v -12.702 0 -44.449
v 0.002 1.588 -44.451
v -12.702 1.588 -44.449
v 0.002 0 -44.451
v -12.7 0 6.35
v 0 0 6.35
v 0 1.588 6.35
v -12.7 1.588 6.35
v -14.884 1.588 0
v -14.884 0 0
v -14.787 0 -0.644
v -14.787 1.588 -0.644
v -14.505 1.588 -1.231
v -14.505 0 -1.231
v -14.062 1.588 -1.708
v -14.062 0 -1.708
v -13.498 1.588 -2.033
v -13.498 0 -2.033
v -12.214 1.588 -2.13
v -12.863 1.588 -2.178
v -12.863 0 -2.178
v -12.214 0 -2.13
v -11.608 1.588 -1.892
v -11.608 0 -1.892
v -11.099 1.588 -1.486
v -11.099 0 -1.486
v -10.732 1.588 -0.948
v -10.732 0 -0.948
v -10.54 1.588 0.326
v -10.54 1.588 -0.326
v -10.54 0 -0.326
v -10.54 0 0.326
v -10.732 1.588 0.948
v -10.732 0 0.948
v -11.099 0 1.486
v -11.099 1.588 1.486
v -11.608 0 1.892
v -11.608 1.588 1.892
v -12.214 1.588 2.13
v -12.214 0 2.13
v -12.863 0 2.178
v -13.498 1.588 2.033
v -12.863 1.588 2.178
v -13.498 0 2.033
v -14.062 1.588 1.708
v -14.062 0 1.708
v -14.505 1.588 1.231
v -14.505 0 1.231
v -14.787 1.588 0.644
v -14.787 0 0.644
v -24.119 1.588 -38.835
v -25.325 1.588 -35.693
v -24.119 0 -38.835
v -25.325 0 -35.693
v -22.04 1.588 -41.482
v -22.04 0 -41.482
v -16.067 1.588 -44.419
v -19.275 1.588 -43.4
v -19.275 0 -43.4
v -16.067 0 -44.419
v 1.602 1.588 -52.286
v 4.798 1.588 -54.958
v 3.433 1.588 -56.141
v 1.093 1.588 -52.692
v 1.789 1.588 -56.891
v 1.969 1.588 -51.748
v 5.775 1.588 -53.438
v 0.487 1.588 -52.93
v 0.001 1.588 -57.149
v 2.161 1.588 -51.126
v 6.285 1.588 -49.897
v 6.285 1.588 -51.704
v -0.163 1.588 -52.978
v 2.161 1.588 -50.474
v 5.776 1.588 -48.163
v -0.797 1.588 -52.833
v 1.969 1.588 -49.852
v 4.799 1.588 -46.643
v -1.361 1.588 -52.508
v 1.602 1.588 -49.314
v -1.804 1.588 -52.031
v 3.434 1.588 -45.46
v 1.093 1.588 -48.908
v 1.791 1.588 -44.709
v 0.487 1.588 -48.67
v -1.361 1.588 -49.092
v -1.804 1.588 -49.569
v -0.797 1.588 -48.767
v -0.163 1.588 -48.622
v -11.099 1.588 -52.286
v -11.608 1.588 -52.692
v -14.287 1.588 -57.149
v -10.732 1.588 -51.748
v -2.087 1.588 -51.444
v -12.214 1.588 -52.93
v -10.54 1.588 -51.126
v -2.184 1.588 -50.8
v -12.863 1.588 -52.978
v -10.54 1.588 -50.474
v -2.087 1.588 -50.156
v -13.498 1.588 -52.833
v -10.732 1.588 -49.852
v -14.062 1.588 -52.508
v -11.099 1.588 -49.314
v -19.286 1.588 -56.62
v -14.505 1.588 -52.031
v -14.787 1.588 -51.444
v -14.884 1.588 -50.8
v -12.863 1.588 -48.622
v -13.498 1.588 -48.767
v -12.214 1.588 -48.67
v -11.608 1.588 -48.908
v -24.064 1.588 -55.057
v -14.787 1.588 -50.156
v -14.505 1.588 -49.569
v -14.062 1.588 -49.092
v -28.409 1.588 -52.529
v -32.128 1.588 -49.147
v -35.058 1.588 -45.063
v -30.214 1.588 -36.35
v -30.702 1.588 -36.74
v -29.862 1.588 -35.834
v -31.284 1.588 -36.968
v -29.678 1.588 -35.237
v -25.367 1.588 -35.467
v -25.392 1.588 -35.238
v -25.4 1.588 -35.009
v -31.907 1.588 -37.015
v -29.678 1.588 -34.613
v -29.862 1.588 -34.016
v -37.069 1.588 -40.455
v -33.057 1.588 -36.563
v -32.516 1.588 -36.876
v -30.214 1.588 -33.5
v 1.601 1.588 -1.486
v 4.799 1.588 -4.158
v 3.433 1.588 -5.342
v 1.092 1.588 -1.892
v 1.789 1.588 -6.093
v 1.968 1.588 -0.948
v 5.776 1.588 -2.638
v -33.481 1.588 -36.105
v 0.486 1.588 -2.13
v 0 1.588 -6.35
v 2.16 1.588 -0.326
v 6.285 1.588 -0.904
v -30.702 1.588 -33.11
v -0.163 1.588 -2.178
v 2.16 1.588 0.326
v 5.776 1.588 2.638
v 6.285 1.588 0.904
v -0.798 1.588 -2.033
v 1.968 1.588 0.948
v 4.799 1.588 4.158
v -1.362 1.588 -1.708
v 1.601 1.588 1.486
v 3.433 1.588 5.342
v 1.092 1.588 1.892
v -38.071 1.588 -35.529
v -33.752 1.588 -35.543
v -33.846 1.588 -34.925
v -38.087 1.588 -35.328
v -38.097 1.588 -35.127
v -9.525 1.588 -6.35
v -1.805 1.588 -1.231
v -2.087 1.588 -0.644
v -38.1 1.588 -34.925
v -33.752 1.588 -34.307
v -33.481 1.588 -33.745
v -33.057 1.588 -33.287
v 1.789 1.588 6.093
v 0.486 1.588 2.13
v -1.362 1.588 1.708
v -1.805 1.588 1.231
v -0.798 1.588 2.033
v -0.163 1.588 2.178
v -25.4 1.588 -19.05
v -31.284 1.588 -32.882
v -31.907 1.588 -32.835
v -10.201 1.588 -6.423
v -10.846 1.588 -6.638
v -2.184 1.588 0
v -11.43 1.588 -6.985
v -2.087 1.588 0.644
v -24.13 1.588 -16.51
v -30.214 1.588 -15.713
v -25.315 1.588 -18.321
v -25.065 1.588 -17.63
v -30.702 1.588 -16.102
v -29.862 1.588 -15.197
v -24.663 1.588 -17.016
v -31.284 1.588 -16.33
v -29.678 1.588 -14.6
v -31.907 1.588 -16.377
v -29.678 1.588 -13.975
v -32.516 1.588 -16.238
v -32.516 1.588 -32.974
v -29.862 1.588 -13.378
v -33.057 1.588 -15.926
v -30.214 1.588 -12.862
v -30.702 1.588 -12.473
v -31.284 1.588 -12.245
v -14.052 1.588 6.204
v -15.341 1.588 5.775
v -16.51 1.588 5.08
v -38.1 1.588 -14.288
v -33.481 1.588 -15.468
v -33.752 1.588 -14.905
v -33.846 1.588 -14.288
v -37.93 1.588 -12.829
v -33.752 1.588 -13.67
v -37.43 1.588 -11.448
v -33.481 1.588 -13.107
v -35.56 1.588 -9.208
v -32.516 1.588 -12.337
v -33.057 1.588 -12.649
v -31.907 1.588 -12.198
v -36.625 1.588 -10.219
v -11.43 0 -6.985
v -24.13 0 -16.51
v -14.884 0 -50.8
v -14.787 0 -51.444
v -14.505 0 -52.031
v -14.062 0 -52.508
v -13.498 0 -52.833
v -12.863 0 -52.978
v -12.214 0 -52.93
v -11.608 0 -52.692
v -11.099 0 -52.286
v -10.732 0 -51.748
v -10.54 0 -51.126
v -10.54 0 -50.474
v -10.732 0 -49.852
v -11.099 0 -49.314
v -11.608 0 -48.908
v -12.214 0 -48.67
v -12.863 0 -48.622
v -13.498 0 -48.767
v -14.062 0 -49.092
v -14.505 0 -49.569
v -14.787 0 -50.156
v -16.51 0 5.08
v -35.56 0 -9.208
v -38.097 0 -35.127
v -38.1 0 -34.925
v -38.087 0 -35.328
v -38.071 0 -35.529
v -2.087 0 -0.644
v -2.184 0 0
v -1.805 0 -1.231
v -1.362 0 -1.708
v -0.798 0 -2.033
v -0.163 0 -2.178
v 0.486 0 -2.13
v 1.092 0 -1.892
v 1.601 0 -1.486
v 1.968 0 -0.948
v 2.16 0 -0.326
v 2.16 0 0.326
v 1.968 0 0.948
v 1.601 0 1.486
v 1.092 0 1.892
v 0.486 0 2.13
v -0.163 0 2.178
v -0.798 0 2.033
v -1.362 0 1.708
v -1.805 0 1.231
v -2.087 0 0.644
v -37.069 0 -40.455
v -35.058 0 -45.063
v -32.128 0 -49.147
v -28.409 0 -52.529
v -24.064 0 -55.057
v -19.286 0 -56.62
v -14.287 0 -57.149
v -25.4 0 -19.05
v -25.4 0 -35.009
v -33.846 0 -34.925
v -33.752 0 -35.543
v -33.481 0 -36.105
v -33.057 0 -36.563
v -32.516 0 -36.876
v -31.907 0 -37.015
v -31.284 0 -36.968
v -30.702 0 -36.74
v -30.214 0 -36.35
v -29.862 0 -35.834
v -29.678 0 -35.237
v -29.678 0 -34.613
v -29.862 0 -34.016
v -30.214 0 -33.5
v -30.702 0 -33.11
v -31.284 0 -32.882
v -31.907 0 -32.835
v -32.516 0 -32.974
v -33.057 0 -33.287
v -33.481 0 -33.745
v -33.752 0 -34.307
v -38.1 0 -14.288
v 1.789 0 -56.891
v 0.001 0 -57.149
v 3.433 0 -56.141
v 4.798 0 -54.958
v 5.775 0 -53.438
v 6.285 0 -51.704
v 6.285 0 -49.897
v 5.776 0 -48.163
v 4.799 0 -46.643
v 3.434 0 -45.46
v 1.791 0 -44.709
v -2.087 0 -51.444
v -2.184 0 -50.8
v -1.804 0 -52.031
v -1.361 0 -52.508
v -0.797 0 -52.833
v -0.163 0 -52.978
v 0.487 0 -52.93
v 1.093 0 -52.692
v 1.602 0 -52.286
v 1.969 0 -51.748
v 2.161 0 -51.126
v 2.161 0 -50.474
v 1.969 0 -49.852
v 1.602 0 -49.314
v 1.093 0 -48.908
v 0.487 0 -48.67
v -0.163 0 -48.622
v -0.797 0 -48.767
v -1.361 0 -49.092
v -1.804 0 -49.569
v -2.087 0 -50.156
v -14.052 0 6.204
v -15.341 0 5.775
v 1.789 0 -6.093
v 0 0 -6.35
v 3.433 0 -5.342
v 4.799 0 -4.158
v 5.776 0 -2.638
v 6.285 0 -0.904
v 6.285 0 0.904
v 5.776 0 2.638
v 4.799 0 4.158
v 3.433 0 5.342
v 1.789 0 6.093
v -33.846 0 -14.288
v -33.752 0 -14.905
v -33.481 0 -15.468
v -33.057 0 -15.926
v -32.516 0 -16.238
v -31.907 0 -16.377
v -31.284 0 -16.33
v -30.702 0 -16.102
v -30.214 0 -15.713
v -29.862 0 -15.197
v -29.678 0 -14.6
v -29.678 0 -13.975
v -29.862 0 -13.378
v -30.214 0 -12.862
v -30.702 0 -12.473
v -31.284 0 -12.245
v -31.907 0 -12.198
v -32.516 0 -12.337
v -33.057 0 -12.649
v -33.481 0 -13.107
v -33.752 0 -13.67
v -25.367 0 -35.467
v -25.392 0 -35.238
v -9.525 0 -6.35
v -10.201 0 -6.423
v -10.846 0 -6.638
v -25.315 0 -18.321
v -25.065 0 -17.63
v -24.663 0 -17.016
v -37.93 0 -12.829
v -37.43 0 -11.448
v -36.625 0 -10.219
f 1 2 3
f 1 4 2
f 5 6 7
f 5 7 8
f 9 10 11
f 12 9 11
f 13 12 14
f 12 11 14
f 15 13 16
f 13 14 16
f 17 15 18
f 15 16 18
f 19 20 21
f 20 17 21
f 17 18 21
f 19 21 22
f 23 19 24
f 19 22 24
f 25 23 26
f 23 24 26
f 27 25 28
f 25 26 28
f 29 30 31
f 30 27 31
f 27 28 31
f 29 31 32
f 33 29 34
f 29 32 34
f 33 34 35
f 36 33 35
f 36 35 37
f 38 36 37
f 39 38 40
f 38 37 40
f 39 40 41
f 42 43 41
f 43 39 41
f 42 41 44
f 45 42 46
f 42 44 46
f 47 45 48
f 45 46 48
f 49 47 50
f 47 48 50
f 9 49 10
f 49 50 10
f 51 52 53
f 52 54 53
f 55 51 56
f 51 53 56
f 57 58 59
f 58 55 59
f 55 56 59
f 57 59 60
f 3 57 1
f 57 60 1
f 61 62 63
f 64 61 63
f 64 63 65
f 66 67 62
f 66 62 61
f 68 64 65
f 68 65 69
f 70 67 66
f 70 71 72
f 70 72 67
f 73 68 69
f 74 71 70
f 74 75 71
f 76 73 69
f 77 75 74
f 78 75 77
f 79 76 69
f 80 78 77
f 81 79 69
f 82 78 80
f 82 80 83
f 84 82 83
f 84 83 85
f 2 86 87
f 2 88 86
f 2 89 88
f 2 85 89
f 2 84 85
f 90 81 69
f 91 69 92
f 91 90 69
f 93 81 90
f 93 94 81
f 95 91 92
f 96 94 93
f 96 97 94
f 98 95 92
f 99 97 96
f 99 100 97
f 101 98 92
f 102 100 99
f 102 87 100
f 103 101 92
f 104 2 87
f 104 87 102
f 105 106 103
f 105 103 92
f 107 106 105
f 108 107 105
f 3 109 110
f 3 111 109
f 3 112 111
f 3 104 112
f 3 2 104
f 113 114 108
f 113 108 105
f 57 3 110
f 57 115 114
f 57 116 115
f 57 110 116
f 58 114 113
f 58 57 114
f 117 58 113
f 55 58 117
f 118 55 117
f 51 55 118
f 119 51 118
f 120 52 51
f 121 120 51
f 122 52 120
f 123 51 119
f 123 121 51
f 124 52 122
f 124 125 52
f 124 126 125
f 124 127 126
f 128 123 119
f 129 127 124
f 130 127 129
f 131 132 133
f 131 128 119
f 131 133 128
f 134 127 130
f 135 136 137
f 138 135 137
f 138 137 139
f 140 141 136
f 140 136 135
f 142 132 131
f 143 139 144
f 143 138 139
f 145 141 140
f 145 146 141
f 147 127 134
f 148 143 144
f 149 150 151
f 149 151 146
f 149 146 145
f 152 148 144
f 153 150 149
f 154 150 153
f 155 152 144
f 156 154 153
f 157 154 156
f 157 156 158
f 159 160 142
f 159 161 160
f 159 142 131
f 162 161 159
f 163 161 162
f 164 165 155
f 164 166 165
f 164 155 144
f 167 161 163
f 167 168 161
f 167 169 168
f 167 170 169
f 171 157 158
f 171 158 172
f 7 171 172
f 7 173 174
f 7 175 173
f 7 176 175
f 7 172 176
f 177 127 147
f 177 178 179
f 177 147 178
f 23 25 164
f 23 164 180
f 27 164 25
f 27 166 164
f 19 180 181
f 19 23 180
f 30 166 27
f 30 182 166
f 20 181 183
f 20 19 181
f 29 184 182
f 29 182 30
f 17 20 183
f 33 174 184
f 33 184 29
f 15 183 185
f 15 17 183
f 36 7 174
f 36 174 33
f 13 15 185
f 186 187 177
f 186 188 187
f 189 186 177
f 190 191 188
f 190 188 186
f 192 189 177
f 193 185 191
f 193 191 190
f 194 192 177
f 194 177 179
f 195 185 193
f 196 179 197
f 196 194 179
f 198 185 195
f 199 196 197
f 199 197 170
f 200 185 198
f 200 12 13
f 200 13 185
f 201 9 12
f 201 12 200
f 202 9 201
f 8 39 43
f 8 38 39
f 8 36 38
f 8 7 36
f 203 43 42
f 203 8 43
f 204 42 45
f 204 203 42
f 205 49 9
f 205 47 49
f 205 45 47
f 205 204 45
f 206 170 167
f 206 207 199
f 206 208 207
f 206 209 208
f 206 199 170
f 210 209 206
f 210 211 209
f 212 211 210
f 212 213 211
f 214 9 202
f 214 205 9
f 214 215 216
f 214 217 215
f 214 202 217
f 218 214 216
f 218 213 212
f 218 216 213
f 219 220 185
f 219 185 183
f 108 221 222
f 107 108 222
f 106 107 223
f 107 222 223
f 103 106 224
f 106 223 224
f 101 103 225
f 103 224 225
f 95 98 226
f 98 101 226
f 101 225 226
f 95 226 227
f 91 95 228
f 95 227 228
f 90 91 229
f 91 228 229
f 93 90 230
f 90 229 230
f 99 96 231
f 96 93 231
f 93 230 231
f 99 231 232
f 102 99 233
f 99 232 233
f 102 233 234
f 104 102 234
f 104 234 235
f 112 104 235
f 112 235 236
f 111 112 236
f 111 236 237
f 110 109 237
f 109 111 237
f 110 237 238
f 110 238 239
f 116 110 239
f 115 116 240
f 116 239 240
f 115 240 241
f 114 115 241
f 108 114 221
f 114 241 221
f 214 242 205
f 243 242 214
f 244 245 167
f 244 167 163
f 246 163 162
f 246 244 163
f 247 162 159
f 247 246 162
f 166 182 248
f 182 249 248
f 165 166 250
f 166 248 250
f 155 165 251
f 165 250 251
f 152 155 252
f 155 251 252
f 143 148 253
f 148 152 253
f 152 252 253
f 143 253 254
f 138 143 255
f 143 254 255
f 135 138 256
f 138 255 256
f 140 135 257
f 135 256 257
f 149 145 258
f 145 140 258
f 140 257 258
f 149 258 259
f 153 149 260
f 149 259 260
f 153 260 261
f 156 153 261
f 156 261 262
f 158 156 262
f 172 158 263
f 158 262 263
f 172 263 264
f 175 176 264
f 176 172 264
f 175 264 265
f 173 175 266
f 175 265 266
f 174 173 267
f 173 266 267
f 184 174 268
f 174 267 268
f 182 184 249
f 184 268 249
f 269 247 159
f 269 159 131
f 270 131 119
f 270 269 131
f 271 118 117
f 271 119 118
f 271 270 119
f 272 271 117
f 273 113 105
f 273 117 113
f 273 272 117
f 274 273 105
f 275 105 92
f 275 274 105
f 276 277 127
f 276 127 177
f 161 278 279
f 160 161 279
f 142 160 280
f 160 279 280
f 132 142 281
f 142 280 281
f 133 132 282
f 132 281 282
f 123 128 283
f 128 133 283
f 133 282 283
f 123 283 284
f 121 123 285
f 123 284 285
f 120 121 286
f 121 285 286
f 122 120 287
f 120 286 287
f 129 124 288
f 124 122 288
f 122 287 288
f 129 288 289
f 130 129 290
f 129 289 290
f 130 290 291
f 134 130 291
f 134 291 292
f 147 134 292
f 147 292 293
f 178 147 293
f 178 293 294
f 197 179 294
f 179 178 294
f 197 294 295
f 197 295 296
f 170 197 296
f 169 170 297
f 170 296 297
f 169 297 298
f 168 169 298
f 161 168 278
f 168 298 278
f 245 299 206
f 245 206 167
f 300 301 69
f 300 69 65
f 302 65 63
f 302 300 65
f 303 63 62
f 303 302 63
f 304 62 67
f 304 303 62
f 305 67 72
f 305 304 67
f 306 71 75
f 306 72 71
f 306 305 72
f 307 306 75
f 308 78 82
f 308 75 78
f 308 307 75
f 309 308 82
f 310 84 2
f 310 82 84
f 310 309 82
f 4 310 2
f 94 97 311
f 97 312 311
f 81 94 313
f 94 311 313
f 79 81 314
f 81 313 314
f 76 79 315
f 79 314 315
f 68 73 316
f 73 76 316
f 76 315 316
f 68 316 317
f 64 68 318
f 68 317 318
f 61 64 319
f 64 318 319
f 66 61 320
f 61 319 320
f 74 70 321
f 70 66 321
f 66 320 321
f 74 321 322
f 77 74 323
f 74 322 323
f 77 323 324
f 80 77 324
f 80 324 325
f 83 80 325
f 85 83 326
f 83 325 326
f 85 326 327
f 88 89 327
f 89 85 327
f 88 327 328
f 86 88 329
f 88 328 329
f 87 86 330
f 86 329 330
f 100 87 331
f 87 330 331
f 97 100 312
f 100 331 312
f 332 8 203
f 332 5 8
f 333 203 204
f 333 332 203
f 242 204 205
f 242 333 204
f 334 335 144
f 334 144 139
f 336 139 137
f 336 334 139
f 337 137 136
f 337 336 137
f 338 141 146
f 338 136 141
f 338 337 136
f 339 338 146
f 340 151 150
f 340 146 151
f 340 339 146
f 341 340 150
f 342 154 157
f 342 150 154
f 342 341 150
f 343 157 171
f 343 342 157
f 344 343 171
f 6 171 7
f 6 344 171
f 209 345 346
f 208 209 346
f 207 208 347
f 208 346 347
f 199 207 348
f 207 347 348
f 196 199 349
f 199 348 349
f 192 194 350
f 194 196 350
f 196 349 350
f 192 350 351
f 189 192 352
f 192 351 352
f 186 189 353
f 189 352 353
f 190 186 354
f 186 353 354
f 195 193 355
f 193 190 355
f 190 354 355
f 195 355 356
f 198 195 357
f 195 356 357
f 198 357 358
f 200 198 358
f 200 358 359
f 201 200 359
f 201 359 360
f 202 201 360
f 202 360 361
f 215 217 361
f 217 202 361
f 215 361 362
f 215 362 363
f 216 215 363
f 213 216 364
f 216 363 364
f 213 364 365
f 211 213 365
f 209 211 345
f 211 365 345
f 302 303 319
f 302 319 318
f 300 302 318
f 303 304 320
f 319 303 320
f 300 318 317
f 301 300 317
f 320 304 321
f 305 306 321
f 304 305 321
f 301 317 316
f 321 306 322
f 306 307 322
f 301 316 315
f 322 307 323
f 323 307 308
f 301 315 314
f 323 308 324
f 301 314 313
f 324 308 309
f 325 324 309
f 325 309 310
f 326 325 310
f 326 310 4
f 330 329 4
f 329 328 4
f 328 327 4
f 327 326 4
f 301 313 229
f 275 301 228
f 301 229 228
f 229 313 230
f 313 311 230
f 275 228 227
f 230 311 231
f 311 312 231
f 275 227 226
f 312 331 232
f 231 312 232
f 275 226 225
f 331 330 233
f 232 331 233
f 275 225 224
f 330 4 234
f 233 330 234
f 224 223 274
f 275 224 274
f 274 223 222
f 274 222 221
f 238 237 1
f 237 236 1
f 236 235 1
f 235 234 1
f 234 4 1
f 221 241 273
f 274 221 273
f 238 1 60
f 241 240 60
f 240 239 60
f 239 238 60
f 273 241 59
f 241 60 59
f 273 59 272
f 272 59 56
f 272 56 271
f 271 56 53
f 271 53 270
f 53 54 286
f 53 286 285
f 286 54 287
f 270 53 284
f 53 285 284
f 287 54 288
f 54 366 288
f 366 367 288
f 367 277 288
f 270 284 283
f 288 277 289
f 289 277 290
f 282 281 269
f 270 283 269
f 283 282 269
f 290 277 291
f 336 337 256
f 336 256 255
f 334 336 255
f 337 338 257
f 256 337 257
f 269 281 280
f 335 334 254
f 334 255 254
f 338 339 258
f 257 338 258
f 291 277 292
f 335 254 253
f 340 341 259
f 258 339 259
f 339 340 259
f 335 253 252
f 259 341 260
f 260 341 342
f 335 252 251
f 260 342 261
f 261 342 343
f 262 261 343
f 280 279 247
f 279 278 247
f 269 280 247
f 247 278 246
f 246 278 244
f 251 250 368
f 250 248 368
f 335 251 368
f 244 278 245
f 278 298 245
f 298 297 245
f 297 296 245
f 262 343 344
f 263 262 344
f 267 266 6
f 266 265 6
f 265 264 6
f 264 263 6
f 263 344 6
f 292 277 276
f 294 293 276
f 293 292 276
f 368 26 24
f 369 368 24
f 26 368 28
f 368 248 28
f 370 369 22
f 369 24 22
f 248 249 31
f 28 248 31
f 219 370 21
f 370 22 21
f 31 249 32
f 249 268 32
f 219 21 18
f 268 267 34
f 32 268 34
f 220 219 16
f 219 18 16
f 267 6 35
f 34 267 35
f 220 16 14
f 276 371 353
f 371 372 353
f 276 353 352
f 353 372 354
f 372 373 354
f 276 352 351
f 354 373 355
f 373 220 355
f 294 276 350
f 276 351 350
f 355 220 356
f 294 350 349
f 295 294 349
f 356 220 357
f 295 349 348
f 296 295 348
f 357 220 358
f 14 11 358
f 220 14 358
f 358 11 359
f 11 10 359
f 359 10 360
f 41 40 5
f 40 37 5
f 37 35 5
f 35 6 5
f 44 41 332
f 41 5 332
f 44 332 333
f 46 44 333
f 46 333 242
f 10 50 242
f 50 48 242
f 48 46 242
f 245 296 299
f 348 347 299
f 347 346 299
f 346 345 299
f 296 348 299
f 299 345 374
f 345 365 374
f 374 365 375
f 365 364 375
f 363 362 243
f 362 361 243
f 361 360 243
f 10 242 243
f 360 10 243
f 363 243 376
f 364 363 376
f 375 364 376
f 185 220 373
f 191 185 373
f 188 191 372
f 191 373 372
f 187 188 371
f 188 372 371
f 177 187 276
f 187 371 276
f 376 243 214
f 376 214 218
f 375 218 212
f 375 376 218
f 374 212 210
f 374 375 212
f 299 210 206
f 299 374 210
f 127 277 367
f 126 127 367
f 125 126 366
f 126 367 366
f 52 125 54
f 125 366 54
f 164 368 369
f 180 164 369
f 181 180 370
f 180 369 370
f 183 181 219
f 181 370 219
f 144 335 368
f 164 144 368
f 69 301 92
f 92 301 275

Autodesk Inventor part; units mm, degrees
ref_plane "YZ Plane" through (0, 0, 0) normal (1, 0, 0) x (0, 1, 0)
ref_plane "XZ Plane" through (0, 0, 0) normal (0, 1, 0) x (-1, 0, 0)
ref_plane "XY Plane" through (0, 0, 0) normal (0, 0, 1) x (1, 0, 0)
sketch "gusset" plane through (0, 0, 0) normal (0, 0, 1) x (1, 0, 0)
  circle A0 centre (-8.9225, 14.8571) radius 2.1844
  circle A1 centre (-21.6225, 14.8571) radius 2.1844
  arc A2 (-21.6225, 21.2071) -> (-21.6225, 8.5071) centre (-21.6225, 14.8571) ccw
  arc A3 (-5.1125, 19.9371) -> (-8.9225, 21.2071) centre (-8.9225, 14.8571) ccw
  line L0 (16.4775, 0.5696) -> (16.4775, -20.0679)
  line L1 (3.7775, -20.1515) -> (3.7775, -4.1929)
  line L2 (2.5075, -1.6529) -> (-10.1925, 7.8721)
  line L3 (-21.6225, 8.5071) -> (-12.0975, 8.5071)
  line L4 (-21.6225, 21.2071) -> (-8.9225, 21.2071)
  arc A4 (16.4775, 0.5696) -> (13.9375, 5.6496) centre (10.1275, 0.5696) ccw
  line L5 (-5.1125, 19.9371) -> (13.9375, 5.6496)
  circle A5 centre (-21.6232, -35.9429) radius 2.1844
  circle A6 centre (-8.9225, -35.9429) radius 2.1844
  line L6 (-21.6246, -29.5943) -> (-8.9205, -29.5916)
  line L7 (-21.6233, -42.2916) -> (-7.3358, -42.2916)
  arc A7 (-21.6246, -29.5943) -> (-21.6233, -42.2916) centre (-21.6232, -35.9429) ccw
  circle A8 centre (10.1275, 0.5696) radius 2.0955
  circle A9 centre (10.1275, -20.0679) radius 2.0955
  arc A10 (3.7775, -4.1929) -> (2.5075, -1.6529) centre (0.6025, -4.1929) ccw
  arc A11 (-10.1925, 7.8721) -> (-12.0975, 8.5071) centre (-12.0975, 5.3321) ccw
  arc A12 (-7.3358, -42.2916) -> (16.4487, -20.6722) centre (-7.3358, -18.3986) ccw
  arc A13 (16.4487, -20.6722) -> (16.4775, -20.0679) centre (10.1275, -20.0679) ccw
  arc A14 (-8.9205, -29.5916) -> (3.7028, -20.8361) centre (-7.3358, -18.3986) ccw
  arc A15 (3.7028, -20.8361) -> (3.7775, -20.1515) centre (0.6025, -20.1515) ccw
  point P0 (-7.0147, -10.522)
  point P1 (16.4775, -20.3474)
  point P2 (3.7775, -20.4691)
  point P3 (4.4125, 12.7933)
  dimension "d0" = 12.7
  dimension "d2" = 12.7
  dimension "d3" = 4.191
  dimension "d4" = 3.175
  dimension "d8" = 12.7
  dimension "d12" = 14.2875
  dimension "d13" = 6.35
  dimension "d14" = 15.875
  dimension "d15" = 3.175
sketch "Sketch1" plane through (0, 0, 0) normal (0, 1, 0) x (-1, 0, 0)
  circle A0 centre (12.7, 0) radius 2.1844
  circle A1 centre (0, 0) radius 2.1844
  arc A2 (0, 6.35) -> (0, -6.35) centre (0, 0) ccw
  arc A3 (16.51, 5.08) -> (12.7, 6.35) centre (12.7, 0) ccw
  line L0 (38.1, -14.2875) -> (38.1, -34.925)
  line L1 (25.4, -35.0086) -> (25.4, -19.05)
  line L2 (24.13, -16.51) -> (11.43, -6.985)
  line L3 (0, -6.35) -> (9.525, -6.35)
  line L4 (0, 6.35) -> (12.7, 6.35)
  arc A4 (38.1, -14.2875) -> (35.56, -9.2075) centre (31.75, -14.2875) ccw
  line L5 (16.51, 5.08) -> (35.56, -9.2075)
  circle A5 centre (-0.0007, -50.8) radius 2.1844
  circle A6 centre (12.7, -50.8) radius 2.1844
  line L6 (-0.0021, -44.4514) -> (12.702, -44.4486)
  line L7 (-0.0008, -57.1486) -> (14.2867, -57.1486)
  arc A7 (-0.0021, -44.4514) -> (-0.0008, -57.1486) centre (-0.0007, -50.8) ccw
  circle A8 centre (31.75, -14.2875) radius 2.0955
  circle A9 centre (31.75, -34.925) radius 2.0955
  arc A10 (25.4, -19.05) -> (24.13, -16.51) centre (22.225, -19.05) ccw
  arc A11 (11.43, -6.985) -> (9.525, -6.35) centre (9.525, -9.525) ccw
  arc A12 (14.2867, -57.1486) -> (38.0712, -35.5292) centre (14.2867, -33.2557) ccw
  arc A13 (38.0712, -35.5292) -> (38.1, -34.925) centre (31.75, -34.925) ccw
  arc A14 (12.702, -44.4486) -> (25.3253, -35.6931) centre (14.2867, -33.2557) ccw
  arc A15 (25.3253, -35.6931) -> (25.4, -35.0086) centre (22.225, -35.0086) ccw
extrude "Extrusion1" add sketch "Sketch1" along normal blind 1.5875
properties part number "Rear Gusset" material "Acetal Resin, White"
